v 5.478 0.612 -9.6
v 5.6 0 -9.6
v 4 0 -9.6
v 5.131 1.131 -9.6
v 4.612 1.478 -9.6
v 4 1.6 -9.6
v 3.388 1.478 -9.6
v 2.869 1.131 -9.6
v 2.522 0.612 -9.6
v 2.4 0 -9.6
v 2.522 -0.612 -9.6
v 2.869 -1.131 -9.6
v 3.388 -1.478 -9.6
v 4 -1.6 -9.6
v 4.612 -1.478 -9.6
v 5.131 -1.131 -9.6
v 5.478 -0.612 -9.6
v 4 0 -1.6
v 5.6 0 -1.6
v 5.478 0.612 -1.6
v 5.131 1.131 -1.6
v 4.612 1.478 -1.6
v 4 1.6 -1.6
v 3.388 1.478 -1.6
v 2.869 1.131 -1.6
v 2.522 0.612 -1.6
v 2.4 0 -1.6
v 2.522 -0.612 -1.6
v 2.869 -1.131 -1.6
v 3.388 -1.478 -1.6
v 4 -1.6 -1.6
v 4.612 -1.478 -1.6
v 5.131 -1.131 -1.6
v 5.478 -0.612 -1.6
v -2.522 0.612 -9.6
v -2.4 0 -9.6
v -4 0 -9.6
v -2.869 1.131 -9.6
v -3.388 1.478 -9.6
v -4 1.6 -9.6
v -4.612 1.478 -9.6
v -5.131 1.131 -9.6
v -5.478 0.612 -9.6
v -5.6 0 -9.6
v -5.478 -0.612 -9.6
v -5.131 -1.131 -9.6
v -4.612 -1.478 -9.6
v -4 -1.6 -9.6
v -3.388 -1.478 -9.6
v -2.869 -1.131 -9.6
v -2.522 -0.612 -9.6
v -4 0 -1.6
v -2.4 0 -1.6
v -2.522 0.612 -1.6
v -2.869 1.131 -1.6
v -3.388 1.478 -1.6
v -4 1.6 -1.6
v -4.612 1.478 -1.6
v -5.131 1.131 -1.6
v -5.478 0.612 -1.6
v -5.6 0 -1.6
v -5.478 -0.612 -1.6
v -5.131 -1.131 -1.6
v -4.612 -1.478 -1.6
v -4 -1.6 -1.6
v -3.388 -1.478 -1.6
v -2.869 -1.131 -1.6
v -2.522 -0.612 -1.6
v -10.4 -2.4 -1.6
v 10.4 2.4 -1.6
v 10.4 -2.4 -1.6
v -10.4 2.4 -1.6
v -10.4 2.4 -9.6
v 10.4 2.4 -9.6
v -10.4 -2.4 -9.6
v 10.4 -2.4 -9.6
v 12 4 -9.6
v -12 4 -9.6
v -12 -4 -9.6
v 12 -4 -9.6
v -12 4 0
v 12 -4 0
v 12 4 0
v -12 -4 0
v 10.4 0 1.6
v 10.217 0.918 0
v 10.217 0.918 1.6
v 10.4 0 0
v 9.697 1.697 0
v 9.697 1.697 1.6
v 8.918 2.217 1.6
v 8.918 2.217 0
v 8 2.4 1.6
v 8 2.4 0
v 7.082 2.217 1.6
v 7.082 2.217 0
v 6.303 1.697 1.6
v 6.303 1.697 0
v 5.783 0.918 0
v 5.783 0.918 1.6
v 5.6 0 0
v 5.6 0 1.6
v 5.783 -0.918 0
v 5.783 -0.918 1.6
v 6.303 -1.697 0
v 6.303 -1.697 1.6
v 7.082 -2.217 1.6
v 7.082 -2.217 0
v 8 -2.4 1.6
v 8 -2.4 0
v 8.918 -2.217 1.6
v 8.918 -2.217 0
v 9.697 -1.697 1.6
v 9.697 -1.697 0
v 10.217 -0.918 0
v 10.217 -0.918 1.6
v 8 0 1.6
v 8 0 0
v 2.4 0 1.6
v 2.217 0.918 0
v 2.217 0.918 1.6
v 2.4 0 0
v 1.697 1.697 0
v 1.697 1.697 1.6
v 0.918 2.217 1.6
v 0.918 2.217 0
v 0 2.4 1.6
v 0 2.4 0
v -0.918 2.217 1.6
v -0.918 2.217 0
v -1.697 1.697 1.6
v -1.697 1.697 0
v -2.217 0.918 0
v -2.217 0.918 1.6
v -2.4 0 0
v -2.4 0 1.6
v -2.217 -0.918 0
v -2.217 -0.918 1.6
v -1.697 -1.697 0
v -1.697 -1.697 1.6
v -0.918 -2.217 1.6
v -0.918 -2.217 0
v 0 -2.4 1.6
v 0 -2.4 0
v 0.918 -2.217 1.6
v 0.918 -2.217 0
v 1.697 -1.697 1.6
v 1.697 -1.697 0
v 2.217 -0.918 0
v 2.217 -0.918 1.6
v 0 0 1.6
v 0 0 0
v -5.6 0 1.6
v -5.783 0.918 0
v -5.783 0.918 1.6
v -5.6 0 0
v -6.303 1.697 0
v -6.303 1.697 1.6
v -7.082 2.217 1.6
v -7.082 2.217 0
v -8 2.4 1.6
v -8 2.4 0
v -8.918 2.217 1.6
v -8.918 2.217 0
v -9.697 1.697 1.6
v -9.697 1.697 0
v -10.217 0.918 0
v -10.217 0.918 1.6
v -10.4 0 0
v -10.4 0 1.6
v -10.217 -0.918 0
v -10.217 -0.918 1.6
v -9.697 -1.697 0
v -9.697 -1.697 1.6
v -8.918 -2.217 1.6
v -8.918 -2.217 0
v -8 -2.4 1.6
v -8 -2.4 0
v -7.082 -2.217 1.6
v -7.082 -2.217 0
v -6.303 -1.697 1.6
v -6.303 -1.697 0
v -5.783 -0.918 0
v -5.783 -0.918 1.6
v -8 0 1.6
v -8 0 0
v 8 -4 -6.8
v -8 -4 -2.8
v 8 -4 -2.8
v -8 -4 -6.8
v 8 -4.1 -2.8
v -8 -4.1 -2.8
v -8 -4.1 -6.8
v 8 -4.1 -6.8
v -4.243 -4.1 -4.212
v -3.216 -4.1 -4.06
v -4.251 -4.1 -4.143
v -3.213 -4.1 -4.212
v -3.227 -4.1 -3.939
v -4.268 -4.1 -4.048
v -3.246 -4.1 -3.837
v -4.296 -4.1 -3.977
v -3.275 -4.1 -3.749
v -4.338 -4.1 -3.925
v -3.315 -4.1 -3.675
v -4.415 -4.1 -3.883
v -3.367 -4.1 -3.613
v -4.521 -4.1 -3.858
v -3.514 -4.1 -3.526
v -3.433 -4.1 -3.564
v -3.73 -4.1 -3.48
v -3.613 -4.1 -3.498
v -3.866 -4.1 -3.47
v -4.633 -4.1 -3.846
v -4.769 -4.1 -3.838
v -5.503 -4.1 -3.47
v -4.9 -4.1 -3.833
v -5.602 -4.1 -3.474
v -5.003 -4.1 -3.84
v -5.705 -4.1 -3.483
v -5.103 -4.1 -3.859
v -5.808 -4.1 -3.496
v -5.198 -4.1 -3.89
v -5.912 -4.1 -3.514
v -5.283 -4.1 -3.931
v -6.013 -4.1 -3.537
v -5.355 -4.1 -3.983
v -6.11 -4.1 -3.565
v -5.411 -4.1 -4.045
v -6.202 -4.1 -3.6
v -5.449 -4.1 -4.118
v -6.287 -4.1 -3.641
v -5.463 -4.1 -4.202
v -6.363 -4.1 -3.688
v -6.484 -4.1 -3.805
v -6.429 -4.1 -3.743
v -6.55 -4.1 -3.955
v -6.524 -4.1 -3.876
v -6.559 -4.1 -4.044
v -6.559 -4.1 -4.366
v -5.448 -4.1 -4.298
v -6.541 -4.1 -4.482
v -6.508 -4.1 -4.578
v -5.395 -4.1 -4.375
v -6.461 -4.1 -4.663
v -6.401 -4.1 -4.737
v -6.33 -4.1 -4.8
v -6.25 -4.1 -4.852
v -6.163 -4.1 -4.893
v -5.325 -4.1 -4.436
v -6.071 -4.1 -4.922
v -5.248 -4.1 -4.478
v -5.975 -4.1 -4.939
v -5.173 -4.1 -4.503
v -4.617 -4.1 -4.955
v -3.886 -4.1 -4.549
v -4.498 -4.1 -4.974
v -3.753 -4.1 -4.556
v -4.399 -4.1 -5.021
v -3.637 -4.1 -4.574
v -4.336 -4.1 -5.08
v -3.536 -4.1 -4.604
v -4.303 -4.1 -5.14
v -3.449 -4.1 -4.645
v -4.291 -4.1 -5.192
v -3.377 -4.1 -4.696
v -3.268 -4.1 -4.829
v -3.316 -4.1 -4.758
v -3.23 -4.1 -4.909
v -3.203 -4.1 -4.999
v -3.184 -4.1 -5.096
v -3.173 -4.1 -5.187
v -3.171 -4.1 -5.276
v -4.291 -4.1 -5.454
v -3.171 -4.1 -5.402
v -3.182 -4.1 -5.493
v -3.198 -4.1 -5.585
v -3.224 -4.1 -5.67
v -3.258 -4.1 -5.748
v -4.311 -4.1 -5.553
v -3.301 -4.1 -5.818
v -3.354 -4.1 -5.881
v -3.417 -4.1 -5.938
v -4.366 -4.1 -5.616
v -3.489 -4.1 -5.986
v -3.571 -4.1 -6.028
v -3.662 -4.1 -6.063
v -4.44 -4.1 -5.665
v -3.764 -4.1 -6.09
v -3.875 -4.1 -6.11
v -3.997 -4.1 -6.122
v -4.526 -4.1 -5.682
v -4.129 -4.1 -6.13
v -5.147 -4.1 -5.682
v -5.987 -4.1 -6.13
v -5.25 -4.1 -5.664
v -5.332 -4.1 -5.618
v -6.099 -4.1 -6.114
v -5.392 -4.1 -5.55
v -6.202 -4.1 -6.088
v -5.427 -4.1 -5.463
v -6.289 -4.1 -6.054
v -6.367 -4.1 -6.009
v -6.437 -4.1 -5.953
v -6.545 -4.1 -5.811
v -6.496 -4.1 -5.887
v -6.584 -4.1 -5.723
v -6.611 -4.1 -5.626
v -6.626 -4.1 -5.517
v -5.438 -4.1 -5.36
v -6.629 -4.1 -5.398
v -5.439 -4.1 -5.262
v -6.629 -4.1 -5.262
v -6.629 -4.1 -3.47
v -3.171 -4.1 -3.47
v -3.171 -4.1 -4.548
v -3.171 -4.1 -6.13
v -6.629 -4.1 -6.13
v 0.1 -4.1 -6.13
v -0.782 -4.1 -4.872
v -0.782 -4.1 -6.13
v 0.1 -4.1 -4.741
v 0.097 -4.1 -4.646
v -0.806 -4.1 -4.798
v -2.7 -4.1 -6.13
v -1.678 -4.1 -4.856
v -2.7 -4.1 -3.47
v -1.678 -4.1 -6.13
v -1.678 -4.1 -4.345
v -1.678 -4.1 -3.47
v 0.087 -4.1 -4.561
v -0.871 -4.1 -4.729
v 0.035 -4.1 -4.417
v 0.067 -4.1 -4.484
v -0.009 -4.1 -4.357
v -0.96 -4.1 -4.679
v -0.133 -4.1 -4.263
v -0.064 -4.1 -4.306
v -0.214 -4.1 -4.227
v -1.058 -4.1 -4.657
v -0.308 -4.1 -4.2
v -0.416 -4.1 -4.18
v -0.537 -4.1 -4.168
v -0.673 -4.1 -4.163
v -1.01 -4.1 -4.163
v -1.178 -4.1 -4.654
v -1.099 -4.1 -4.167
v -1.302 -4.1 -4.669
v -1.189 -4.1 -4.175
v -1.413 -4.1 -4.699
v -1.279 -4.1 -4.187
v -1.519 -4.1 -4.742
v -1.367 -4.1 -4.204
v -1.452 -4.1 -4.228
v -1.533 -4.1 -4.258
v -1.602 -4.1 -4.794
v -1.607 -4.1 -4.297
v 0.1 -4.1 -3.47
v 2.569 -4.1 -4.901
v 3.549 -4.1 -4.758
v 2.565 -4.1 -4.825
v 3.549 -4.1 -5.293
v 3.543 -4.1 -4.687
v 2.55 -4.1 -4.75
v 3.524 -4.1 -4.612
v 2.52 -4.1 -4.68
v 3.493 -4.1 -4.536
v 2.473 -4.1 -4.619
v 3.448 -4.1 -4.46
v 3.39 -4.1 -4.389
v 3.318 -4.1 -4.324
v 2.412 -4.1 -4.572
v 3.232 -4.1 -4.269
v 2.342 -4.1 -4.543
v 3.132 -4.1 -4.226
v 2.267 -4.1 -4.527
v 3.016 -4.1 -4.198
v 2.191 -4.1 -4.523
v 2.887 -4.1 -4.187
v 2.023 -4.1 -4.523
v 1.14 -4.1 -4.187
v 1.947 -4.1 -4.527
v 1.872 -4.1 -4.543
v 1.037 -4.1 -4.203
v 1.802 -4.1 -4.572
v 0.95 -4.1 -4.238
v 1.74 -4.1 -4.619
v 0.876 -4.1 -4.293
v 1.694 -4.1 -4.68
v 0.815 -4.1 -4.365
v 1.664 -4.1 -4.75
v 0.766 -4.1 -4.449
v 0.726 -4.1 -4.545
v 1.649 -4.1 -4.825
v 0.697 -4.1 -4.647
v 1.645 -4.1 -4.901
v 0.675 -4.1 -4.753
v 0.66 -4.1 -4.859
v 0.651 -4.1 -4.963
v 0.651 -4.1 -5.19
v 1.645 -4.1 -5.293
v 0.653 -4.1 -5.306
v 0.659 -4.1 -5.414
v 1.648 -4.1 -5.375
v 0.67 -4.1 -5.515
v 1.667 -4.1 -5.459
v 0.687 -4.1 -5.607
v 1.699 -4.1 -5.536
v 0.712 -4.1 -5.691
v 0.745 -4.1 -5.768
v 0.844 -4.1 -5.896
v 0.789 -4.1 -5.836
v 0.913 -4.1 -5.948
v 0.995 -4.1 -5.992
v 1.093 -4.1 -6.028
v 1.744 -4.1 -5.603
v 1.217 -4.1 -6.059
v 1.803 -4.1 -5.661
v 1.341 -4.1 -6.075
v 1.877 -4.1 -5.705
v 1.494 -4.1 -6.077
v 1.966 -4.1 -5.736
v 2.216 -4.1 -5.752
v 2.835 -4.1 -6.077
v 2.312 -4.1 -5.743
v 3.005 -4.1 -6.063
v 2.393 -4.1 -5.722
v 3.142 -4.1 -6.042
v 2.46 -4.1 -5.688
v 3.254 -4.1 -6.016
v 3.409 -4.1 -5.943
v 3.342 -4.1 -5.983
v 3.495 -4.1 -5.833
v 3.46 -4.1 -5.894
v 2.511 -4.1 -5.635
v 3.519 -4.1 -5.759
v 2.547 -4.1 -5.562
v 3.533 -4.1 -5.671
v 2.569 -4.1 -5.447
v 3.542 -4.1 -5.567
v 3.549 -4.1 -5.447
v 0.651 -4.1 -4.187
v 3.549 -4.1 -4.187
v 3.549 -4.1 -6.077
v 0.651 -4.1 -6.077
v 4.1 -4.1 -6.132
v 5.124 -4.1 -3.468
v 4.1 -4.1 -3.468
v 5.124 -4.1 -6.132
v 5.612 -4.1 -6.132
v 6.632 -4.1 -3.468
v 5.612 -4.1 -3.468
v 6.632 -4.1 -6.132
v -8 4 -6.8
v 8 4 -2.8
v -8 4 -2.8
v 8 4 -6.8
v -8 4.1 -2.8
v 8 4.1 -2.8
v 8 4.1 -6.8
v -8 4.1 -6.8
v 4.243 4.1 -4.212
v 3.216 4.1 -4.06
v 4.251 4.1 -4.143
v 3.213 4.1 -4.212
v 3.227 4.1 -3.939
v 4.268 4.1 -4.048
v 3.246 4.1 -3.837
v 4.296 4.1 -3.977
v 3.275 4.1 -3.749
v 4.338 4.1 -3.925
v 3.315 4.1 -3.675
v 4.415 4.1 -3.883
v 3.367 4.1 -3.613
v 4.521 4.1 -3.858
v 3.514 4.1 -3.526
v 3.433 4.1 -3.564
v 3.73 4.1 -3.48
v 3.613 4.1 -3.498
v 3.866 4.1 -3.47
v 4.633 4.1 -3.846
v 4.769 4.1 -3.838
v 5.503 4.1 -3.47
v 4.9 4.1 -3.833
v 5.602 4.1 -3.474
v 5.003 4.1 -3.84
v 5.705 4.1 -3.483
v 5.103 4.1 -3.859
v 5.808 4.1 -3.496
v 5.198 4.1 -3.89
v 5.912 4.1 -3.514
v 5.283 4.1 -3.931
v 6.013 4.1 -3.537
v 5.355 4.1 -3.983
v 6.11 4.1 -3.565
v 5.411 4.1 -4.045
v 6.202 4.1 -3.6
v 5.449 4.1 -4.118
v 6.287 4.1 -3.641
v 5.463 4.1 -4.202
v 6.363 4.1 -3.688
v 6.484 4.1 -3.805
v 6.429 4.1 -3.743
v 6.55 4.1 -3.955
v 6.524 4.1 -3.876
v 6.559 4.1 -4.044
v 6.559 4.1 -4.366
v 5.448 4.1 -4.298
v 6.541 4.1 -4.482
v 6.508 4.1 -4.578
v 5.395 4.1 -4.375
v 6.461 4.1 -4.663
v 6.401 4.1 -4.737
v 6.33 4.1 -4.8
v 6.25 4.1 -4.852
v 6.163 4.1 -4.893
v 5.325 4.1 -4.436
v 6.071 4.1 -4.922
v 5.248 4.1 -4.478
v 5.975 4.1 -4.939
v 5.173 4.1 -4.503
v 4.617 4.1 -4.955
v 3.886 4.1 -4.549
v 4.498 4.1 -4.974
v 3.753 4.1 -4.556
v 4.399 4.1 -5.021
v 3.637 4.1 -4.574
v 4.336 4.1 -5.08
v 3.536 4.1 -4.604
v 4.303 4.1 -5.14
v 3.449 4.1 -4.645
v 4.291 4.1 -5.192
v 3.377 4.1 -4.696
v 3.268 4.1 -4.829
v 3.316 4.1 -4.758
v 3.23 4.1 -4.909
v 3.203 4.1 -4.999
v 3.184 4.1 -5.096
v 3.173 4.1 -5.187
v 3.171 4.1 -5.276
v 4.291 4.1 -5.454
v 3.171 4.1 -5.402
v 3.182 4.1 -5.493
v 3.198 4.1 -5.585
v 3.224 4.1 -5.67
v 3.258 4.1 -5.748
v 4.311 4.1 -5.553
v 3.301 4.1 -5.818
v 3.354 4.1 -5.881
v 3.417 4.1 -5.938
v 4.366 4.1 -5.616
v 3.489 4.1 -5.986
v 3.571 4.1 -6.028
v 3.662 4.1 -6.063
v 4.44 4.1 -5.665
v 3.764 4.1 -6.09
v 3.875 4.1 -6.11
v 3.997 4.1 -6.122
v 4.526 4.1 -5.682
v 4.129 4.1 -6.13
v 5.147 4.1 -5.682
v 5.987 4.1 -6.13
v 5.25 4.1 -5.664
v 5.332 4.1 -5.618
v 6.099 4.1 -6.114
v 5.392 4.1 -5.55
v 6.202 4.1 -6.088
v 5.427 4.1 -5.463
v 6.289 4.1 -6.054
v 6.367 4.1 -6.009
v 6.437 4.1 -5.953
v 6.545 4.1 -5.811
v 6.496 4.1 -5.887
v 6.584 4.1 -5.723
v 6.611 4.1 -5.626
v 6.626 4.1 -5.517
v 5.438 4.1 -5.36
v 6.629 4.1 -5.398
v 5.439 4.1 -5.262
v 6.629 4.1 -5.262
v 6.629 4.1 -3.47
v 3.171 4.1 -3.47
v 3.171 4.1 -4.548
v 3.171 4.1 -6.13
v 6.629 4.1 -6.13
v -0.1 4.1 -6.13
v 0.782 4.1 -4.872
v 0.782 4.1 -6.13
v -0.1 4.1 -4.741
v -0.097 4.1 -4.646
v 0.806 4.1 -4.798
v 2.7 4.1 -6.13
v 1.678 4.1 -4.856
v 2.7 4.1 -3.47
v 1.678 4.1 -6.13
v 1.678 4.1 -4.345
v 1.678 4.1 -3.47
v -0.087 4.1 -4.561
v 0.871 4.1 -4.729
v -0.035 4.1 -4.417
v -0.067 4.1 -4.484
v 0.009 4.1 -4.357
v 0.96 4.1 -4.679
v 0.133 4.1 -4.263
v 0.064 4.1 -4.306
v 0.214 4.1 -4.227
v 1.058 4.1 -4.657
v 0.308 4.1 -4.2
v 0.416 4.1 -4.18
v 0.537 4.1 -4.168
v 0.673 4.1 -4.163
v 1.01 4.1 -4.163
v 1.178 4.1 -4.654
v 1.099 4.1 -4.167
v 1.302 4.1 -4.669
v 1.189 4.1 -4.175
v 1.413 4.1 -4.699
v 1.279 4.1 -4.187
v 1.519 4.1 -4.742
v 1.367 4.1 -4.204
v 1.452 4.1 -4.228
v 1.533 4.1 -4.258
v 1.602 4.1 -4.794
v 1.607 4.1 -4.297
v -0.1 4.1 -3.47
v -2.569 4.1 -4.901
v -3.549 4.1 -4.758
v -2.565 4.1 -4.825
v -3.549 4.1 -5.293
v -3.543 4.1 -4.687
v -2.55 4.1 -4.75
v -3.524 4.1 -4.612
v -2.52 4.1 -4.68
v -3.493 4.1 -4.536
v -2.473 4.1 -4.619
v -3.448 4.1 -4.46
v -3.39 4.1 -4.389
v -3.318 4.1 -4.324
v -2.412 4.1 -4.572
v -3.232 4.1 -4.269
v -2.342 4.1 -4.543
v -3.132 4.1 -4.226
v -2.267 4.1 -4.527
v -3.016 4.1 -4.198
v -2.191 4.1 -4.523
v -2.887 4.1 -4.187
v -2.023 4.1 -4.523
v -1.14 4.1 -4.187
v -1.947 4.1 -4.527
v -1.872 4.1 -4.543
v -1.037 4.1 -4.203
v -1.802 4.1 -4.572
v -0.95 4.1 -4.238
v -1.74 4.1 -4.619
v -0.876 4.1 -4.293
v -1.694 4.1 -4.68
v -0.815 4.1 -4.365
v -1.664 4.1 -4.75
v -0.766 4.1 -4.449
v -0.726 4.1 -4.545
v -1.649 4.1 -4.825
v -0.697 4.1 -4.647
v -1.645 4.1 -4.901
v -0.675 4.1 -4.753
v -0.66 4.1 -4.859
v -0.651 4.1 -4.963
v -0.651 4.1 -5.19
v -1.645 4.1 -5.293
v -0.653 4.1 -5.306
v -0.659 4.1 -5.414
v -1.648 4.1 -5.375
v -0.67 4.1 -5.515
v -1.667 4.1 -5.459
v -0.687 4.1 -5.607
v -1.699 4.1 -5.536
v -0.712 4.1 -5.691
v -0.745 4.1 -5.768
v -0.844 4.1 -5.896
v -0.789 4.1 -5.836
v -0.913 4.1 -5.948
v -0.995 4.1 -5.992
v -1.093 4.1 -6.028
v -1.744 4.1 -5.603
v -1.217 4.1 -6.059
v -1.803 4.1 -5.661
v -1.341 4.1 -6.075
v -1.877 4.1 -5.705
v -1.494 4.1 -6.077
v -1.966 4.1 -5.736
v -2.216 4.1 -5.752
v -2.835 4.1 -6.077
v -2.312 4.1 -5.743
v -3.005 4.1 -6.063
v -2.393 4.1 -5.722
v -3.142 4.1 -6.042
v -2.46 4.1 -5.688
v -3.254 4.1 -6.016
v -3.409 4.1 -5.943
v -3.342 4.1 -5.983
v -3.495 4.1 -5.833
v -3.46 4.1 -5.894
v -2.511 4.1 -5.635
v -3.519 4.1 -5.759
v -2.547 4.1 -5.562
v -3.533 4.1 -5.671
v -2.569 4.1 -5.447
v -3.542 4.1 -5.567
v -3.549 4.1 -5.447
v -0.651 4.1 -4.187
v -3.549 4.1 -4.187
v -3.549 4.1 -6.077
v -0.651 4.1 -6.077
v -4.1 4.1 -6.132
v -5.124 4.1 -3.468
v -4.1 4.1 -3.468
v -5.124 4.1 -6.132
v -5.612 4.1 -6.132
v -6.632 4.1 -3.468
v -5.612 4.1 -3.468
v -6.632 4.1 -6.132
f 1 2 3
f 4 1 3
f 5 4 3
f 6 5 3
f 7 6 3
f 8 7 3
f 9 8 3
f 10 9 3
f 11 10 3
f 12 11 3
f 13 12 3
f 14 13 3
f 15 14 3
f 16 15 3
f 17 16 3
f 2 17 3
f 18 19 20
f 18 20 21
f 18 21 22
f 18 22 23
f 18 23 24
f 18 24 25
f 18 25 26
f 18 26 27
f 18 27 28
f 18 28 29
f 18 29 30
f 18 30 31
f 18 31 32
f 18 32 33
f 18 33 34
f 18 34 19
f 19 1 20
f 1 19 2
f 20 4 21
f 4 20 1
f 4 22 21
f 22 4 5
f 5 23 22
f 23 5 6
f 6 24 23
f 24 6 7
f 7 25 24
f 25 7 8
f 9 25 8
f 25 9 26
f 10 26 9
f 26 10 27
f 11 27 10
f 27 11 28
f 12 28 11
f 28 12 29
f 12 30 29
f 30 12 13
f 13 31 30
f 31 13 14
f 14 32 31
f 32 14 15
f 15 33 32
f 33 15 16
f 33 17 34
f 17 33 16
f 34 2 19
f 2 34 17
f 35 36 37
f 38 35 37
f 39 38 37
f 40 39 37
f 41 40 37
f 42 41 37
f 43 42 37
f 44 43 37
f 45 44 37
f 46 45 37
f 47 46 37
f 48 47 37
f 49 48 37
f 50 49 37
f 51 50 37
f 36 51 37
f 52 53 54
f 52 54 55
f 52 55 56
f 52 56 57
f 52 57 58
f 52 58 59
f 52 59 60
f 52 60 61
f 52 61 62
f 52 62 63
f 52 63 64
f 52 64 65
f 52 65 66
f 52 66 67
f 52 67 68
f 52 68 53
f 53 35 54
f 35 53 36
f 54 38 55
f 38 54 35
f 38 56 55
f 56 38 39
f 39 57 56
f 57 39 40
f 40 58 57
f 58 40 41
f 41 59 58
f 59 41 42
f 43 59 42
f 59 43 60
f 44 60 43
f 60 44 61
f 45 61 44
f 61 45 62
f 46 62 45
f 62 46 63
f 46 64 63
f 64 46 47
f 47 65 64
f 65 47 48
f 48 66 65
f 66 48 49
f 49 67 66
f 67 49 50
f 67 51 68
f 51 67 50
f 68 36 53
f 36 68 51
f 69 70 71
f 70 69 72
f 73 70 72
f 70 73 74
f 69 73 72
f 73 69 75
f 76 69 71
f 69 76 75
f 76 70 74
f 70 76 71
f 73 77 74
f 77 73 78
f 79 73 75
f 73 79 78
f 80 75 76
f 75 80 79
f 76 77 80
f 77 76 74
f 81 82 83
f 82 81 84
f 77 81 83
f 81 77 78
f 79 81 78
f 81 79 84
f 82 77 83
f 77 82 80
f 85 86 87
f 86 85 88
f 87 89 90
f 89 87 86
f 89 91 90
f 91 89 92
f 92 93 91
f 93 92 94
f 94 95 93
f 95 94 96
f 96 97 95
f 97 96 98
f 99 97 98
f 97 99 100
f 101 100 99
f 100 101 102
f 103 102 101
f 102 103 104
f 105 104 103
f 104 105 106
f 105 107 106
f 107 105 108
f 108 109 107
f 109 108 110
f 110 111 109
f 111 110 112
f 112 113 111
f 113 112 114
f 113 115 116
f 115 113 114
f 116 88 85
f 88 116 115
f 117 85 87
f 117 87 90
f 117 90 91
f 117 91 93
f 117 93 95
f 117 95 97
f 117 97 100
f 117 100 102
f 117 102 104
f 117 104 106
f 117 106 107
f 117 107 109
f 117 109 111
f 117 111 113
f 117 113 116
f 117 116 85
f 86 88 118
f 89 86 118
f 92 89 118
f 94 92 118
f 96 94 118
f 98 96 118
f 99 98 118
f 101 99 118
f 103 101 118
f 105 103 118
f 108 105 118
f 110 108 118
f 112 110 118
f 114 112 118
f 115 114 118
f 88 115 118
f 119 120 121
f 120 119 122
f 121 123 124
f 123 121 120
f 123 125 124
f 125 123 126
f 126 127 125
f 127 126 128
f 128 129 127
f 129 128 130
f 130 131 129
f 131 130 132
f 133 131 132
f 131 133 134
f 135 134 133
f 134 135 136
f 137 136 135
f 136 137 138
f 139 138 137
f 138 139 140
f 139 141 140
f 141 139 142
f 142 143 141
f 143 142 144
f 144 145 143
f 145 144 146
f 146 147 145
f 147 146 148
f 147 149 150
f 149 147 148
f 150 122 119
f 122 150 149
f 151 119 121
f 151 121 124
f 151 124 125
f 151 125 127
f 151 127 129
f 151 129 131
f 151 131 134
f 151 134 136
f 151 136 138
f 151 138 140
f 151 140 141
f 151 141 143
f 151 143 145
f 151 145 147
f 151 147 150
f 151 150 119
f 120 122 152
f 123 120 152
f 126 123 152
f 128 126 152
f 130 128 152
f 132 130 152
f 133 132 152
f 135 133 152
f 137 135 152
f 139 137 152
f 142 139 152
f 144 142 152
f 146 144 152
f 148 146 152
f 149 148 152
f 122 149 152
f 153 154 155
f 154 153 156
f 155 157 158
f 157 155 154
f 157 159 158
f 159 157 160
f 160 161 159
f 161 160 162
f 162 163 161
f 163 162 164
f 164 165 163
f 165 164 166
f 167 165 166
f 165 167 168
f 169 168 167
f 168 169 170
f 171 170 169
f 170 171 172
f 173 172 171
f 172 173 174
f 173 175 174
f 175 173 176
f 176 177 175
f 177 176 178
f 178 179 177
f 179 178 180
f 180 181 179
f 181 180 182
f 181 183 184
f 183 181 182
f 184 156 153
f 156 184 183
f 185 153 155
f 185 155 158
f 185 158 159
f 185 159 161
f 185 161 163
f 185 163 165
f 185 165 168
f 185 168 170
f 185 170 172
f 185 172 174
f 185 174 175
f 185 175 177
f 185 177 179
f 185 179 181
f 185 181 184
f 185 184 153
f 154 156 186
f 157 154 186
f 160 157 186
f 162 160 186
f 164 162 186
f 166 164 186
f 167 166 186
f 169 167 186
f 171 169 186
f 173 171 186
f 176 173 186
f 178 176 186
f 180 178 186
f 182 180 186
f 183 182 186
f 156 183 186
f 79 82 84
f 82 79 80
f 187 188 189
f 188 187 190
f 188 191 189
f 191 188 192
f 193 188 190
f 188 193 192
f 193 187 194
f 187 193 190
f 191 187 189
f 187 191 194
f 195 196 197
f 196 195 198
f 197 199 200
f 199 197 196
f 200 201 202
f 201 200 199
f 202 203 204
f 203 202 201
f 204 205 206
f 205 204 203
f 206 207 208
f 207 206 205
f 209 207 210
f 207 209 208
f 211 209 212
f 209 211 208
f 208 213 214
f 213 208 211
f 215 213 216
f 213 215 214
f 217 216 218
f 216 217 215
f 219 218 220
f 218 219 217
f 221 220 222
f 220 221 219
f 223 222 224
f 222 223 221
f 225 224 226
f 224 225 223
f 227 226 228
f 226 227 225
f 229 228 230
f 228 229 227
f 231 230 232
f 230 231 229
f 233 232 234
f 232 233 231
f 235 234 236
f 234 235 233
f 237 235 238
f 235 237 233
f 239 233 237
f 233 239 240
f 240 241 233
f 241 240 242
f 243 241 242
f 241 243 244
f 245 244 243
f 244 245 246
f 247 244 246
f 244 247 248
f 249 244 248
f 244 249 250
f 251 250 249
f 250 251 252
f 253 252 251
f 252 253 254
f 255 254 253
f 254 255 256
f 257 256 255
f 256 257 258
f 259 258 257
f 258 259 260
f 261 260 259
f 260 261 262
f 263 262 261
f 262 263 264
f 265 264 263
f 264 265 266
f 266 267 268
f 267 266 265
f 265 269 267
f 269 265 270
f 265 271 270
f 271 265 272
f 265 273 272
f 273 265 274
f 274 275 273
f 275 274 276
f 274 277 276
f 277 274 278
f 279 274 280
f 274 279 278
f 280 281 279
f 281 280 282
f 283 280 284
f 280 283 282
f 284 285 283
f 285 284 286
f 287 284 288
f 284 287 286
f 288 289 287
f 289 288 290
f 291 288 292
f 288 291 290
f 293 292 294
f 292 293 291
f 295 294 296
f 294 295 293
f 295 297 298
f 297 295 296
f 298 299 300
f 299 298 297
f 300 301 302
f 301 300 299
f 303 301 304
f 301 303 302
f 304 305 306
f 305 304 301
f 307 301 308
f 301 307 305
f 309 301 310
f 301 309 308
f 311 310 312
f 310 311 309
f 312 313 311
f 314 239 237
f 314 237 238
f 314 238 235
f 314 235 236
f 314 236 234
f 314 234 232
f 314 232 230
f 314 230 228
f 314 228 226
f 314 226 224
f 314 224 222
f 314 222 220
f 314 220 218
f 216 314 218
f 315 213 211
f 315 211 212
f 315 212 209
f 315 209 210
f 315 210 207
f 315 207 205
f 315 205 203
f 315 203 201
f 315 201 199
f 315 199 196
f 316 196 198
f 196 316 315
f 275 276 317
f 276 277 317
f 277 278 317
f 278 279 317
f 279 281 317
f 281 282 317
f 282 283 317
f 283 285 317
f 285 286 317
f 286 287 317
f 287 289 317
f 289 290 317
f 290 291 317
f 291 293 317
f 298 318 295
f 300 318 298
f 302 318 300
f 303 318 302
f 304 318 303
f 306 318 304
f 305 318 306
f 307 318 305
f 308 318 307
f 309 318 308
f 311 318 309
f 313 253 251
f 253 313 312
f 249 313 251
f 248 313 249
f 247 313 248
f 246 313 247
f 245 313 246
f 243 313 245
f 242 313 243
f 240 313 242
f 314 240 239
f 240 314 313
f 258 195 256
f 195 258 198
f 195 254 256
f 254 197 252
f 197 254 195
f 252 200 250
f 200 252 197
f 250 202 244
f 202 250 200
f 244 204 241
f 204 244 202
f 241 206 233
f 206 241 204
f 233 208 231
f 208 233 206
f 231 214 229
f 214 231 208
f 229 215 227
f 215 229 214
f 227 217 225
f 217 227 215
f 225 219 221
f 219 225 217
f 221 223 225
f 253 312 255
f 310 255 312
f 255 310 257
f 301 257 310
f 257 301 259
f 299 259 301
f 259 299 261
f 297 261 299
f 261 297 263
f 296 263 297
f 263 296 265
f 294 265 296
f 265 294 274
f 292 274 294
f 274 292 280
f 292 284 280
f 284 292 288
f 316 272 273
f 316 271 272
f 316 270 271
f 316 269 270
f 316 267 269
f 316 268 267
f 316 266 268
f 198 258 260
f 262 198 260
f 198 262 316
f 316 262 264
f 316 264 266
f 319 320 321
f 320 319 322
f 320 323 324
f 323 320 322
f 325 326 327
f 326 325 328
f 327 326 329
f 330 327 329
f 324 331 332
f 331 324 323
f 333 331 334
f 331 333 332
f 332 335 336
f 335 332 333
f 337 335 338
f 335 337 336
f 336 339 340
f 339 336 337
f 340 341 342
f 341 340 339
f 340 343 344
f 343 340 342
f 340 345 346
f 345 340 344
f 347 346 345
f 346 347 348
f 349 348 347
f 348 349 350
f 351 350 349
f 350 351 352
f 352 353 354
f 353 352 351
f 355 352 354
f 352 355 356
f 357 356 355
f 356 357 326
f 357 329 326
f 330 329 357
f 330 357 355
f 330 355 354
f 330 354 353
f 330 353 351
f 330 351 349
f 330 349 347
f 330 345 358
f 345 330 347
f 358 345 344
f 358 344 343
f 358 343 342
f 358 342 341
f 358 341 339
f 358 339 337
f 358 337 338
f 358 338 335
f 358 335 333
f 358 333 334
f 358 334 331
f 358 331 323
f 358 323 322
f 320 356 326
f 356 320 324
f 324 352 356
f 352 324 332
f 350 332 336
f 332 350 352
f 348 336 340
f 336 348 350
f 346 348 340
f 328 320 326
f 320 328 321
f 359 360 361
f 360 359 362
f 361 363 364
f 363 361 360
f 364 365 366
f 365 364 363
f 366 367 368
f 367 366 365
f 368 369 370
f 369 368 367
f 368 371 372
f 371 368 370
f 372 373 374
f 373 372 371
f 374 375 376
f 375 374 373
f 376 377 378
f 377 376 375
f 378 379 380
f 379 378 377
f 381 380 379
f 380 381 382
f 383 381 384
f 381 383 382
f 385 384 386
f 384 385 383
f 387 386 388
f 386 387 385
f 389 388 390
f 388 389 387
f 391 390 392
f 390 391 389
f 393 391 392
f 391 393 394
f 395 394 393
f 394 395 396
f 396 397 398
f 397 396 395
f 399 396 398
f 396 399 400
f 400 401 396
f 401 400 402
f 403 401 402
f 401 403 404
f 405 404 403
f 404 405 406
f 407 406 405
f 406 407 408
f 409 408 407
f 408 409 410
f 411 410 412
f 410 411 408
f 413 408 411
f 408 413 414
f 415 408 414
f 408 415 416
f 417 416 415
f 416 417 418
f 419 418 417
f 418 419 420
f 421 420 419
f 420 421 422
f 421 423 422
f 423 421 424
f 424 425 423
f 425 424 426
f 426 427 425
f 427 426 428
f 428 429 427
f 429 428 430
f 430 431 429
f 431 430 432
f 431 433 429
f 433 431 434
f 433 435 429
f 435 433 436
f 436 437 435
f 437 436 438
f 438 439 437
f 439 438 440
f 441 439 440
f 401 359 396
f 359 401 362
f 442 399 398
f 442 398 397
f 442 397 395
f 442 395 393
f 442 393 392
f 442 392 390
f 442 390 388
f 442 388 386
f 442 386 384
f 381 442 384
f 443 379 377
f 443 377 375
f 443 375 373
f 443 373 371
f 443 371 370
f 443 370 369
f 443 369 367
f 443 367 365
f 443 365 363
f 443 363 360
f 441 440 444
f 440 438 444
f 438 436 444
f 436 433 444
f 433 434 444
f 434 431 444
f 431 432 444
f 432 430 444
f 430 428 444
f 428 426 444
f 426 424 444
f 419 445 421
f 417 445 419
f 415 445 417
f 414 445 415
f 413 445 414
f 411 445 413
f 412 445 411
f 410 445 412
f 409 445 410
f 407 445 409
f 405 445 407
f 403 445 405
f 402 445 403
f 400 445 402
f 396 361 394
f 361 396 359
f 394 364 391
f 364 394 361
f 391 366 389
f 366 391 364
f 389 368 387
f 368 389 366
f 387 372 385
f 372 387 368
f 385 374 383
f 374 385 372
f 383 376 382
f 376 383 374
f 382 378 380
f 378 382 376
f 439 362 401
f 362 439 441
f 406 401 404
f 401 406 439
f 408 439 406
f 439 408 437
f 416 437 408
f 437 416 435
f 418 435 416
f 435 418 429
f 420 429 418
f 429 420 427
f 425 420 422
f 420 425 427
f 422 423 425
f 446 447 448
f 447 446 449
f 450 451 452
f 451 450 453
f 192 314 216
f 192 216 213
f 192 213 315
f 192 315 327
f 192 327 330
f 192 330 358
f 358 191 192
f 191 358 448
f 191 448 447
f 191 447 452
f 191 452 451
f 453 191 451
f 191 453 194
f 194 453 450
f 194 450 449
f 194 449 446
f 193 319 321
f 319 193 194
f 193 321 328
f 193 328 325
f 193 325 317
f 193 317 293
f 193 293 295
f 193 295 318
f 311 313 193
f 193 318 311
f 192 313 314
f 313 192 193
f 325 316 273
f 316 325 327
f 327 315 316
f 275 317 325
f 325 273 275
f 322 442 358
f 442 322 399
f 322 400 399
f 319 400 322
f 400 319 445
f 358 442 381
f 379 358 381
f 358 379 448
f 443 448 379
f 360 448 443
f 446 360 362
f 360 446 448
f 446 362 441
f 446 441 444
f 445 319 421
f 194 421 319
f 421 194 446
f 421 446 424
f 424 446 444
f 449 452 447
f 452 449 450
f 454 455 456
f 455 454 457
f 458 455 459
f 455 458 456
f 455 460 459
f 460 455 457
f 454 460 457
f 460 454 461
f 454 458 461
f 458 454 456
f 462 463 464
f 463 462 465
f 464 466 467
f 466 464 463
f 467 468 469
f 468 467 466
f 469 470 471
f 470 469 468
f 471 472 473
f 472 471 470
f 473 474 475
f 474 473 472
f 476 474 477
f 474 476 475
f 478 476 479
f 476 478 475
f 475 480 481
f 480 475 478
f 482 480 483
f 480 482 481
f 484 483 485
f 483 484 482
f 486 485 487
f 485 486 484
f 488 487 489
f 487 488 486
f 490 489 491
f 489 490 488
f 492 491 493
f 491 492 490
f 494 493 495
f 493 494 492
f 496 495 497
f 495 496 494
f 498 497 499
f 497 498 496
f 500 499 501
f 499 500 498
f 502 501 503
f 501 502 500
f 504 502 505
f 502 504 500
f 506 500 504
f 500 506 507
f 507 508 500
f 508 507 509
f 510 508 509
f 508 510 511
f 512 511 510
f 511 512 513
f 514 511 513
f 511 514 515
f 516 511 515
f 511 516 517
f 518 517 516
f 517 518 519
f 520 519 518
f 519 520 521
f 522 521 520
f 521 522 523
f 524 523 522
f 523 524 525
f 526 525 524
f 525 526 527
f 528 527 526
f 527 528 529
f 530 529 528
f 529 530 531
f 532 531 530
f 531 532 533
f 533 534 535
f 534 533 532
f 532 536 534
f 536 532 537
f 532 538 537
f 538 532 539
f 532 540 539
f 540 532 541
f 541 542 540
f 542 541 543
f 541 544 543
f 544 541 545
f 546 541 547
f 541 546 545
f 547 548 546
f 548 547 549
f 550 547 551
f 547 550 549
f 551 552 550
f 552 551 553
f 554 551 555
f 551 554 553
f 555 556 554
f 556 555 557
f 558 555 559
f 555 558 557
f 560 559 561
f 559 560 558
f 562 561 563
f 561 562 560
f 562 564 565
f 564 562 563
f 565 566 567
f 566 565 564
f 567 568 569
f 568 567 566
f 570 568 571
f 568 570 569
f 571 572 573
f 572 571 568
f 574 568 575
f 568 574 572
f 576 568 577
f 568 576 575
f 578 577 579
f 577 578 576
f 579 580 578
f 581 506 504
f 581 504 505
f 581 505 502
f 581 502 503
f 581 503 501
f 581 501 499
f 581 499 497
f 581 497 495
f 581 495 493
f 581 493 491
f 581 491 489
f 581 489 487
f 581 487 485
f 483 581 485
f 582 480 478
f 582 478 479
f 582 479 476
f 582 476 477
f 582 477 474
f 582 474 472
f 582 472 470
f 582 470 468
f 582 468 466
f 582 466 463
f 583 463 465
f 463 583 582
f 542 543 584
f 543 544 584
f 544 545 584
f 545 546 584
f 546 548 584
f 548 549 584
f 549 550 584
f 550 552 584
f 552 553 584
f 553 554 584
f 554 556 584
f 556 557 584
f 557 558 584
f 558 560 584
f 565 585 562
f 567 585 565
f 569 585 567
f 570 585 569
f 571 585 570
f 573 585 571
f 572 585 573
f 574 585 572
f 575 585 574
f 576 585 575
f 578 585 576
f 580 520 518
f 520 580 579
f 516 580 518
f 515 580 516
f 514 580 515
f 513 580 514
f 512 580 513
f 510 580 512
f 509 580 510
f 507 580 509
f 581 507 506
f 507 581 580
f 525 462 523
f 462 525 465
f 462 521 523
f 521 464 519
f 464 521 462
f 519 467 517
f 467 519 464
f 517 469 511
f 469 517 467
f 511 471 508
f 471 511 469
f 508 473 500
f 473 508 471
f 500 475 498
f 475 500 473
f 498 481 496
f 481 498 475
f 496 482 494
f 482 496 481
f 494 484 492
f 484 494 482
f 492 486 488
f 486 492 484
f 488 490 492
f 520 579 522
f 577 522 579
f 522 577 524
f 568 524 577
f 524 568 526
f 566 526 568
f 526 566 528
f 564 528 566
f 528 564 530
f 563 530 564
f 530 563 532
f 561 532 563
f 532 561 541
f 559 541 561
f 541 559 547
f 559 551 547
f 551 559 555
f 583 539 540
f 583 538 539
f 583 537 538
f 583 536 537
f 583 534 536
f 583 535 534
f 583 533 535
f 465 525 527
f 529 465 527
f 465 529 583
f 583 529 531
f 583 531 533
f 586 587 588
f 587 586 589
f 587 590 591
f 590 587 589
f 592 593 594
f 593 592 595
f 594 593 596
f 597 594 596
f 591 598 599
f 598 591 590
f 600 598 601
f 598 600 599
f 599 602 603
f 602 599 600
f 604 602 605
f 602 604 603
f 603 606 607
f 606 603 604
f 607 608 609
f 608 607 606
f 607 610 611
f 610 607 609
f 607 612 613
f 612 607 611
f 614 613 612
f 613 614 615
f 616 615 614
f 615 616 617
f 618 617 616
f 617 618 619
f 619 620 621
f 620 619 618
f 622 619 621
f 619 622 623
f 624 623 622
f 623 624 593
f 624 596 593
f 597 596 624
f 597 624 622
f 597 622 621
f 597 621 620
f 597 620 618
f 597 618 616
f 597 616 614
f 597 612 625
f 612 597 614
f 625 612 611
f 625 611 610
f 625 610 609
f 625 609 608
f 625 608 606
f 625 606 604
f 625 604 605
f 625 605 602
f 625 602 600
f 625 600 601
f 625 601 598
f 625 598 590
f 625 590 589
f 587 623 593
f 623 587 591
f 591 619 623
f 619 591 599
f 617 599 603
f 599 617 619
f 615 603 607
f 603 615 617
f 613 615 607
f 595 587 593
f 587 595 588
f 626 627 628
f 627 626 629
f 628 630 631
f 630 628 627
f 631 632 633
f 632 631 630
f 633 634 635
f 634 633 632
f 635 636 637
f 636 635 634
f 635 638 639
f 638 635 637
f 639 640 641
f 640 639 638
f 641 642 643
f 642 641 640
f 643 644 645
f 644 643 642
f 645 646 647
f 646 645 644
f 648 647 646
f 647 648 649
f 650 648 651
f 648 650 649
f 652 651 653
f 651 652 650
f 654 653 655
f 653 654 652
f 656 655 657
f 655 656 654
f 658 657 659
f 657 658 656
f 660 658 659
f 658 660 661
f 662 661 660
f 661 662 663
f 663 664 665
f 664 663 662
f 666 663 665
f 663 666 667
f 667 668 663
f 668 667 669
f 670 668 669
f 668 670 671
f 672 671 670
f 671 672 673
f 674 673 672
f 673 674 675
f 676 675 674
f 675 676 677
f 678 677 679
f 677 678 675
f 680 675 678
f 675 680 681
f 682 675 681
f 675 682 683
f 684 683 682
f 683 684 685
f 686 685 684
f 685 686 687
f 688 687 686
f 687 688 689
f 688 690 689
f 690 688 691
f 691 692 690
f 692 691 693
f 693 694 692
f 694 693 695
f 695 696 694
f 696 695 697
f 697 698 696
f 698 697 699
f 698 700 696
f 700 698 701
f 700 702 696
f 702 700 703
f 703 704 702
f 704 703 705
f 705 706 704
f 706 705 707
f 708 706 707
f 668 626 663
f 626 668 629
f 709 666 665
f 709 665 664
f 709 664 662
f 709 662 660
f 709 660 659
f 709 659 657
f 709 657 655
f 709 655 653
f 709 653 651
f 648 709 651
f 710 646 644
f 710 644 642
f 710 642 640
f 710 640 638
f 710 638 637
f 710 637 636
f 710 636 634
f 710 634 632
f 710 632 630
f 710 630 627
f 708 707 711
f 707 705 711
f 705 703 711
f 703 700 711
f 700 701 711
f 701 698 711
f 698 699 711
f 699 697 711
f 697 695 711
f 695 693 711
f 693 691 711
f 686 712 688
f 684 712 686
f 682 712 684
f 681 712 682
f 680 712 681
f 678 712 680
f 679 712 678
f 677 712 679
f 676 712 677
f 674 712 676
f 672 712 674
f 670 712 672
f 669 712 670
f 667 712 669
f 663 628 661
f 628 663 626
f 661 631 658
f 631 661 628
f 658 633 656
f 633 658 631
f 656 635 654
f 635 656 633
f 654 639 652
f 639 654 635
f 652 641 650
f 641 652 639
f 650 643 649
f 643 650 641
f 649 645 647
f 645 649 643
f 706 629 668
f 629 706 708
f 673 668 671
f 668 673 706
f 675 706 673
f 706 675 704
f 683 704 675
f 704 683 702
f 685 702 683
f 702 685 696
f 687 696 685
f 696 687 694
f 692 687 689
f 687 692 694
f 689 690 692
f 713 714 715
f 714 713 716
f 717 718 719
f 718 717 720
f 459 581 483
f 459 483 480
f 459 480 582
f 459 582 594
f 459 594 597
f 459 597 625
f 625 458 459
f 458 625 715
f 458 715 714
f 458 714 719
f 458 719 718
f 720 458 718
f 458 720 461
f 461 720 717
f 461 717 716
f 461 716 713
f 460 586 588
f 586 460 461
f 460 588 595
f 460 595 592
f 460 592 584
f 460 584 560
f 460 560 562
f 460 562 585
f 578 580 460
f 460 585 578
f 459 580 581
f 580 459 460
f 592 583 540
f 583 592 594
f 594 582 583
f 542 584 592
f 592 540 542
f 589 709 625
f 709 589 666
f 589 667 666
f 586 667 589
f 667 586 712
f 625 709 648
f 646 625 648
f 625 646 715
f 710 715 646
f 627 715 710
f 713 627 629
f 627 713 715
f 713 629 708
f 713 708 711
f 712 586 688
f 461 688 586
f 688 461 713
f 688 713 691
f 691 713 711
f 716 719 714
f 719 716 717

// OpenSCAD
use <../lib.scad>
use <190155h.scad>
use <3622.scad>
function ldraw_lib__3622d05() = [
// 0 Brick  1 x  3 with Red "Shell" Sticker on Both Sides
// 0 Name: 3622d05.dat
// 0 Author: Takeshi Takahashi [RainbowDolphin]
// 0 !LDRAW_ORG Shortcut UPDATE 2024-07
// 0 !LICENSE Licensed under CC BY 4.0 : see CAreadme.txt
// 
// 0 BFC CERTIFY CCW
  [0,"BFC","CERTIFY"],
  [0,"BFC","CCW"],
// 
// 0 !CATEGORY Sticker Shortcut
// 0 !KEYWORDS Bricklink 3622pb014, Service station, Set 6378
// 
// 0 !HISTORY 2024-08-26 [OrionP] Official Update 2024-07
// 
// 1 16 0 0 0 1 0 0 0 1 0 0 0 1 3622.dat
  [1,16,0,0,0,1,0,0,0,1,0,0,0,1, ldraw_lib__3622()],
// 1 16 0 12 -10 1 0 0 0 0 -1 0 1 0 190155h.dat
  [1,16,0,12,-10,1,0,0,0,0,-1,0,1,0, ldraw_lib__190155h()],
// 1 16 0 12 10 -1 0 0 0 0 -1 0 -1 0 190155h.dat
  [1,16,0,12,10,-1,0,0,0,0,-1,0,-1,0, ldraw_lib__190155h()],
];
module ldraw_lib__3622d05(step=0, col=false, unit=2/5, alt=false, line=0.2, solid=!$preview)
    makepoly(ldraw_lib__3622d05(), step=step, col=col, unit=unit, alt=alt, line=line, solid=solid);
ldraw_lib__3622d05(line=0.2);
